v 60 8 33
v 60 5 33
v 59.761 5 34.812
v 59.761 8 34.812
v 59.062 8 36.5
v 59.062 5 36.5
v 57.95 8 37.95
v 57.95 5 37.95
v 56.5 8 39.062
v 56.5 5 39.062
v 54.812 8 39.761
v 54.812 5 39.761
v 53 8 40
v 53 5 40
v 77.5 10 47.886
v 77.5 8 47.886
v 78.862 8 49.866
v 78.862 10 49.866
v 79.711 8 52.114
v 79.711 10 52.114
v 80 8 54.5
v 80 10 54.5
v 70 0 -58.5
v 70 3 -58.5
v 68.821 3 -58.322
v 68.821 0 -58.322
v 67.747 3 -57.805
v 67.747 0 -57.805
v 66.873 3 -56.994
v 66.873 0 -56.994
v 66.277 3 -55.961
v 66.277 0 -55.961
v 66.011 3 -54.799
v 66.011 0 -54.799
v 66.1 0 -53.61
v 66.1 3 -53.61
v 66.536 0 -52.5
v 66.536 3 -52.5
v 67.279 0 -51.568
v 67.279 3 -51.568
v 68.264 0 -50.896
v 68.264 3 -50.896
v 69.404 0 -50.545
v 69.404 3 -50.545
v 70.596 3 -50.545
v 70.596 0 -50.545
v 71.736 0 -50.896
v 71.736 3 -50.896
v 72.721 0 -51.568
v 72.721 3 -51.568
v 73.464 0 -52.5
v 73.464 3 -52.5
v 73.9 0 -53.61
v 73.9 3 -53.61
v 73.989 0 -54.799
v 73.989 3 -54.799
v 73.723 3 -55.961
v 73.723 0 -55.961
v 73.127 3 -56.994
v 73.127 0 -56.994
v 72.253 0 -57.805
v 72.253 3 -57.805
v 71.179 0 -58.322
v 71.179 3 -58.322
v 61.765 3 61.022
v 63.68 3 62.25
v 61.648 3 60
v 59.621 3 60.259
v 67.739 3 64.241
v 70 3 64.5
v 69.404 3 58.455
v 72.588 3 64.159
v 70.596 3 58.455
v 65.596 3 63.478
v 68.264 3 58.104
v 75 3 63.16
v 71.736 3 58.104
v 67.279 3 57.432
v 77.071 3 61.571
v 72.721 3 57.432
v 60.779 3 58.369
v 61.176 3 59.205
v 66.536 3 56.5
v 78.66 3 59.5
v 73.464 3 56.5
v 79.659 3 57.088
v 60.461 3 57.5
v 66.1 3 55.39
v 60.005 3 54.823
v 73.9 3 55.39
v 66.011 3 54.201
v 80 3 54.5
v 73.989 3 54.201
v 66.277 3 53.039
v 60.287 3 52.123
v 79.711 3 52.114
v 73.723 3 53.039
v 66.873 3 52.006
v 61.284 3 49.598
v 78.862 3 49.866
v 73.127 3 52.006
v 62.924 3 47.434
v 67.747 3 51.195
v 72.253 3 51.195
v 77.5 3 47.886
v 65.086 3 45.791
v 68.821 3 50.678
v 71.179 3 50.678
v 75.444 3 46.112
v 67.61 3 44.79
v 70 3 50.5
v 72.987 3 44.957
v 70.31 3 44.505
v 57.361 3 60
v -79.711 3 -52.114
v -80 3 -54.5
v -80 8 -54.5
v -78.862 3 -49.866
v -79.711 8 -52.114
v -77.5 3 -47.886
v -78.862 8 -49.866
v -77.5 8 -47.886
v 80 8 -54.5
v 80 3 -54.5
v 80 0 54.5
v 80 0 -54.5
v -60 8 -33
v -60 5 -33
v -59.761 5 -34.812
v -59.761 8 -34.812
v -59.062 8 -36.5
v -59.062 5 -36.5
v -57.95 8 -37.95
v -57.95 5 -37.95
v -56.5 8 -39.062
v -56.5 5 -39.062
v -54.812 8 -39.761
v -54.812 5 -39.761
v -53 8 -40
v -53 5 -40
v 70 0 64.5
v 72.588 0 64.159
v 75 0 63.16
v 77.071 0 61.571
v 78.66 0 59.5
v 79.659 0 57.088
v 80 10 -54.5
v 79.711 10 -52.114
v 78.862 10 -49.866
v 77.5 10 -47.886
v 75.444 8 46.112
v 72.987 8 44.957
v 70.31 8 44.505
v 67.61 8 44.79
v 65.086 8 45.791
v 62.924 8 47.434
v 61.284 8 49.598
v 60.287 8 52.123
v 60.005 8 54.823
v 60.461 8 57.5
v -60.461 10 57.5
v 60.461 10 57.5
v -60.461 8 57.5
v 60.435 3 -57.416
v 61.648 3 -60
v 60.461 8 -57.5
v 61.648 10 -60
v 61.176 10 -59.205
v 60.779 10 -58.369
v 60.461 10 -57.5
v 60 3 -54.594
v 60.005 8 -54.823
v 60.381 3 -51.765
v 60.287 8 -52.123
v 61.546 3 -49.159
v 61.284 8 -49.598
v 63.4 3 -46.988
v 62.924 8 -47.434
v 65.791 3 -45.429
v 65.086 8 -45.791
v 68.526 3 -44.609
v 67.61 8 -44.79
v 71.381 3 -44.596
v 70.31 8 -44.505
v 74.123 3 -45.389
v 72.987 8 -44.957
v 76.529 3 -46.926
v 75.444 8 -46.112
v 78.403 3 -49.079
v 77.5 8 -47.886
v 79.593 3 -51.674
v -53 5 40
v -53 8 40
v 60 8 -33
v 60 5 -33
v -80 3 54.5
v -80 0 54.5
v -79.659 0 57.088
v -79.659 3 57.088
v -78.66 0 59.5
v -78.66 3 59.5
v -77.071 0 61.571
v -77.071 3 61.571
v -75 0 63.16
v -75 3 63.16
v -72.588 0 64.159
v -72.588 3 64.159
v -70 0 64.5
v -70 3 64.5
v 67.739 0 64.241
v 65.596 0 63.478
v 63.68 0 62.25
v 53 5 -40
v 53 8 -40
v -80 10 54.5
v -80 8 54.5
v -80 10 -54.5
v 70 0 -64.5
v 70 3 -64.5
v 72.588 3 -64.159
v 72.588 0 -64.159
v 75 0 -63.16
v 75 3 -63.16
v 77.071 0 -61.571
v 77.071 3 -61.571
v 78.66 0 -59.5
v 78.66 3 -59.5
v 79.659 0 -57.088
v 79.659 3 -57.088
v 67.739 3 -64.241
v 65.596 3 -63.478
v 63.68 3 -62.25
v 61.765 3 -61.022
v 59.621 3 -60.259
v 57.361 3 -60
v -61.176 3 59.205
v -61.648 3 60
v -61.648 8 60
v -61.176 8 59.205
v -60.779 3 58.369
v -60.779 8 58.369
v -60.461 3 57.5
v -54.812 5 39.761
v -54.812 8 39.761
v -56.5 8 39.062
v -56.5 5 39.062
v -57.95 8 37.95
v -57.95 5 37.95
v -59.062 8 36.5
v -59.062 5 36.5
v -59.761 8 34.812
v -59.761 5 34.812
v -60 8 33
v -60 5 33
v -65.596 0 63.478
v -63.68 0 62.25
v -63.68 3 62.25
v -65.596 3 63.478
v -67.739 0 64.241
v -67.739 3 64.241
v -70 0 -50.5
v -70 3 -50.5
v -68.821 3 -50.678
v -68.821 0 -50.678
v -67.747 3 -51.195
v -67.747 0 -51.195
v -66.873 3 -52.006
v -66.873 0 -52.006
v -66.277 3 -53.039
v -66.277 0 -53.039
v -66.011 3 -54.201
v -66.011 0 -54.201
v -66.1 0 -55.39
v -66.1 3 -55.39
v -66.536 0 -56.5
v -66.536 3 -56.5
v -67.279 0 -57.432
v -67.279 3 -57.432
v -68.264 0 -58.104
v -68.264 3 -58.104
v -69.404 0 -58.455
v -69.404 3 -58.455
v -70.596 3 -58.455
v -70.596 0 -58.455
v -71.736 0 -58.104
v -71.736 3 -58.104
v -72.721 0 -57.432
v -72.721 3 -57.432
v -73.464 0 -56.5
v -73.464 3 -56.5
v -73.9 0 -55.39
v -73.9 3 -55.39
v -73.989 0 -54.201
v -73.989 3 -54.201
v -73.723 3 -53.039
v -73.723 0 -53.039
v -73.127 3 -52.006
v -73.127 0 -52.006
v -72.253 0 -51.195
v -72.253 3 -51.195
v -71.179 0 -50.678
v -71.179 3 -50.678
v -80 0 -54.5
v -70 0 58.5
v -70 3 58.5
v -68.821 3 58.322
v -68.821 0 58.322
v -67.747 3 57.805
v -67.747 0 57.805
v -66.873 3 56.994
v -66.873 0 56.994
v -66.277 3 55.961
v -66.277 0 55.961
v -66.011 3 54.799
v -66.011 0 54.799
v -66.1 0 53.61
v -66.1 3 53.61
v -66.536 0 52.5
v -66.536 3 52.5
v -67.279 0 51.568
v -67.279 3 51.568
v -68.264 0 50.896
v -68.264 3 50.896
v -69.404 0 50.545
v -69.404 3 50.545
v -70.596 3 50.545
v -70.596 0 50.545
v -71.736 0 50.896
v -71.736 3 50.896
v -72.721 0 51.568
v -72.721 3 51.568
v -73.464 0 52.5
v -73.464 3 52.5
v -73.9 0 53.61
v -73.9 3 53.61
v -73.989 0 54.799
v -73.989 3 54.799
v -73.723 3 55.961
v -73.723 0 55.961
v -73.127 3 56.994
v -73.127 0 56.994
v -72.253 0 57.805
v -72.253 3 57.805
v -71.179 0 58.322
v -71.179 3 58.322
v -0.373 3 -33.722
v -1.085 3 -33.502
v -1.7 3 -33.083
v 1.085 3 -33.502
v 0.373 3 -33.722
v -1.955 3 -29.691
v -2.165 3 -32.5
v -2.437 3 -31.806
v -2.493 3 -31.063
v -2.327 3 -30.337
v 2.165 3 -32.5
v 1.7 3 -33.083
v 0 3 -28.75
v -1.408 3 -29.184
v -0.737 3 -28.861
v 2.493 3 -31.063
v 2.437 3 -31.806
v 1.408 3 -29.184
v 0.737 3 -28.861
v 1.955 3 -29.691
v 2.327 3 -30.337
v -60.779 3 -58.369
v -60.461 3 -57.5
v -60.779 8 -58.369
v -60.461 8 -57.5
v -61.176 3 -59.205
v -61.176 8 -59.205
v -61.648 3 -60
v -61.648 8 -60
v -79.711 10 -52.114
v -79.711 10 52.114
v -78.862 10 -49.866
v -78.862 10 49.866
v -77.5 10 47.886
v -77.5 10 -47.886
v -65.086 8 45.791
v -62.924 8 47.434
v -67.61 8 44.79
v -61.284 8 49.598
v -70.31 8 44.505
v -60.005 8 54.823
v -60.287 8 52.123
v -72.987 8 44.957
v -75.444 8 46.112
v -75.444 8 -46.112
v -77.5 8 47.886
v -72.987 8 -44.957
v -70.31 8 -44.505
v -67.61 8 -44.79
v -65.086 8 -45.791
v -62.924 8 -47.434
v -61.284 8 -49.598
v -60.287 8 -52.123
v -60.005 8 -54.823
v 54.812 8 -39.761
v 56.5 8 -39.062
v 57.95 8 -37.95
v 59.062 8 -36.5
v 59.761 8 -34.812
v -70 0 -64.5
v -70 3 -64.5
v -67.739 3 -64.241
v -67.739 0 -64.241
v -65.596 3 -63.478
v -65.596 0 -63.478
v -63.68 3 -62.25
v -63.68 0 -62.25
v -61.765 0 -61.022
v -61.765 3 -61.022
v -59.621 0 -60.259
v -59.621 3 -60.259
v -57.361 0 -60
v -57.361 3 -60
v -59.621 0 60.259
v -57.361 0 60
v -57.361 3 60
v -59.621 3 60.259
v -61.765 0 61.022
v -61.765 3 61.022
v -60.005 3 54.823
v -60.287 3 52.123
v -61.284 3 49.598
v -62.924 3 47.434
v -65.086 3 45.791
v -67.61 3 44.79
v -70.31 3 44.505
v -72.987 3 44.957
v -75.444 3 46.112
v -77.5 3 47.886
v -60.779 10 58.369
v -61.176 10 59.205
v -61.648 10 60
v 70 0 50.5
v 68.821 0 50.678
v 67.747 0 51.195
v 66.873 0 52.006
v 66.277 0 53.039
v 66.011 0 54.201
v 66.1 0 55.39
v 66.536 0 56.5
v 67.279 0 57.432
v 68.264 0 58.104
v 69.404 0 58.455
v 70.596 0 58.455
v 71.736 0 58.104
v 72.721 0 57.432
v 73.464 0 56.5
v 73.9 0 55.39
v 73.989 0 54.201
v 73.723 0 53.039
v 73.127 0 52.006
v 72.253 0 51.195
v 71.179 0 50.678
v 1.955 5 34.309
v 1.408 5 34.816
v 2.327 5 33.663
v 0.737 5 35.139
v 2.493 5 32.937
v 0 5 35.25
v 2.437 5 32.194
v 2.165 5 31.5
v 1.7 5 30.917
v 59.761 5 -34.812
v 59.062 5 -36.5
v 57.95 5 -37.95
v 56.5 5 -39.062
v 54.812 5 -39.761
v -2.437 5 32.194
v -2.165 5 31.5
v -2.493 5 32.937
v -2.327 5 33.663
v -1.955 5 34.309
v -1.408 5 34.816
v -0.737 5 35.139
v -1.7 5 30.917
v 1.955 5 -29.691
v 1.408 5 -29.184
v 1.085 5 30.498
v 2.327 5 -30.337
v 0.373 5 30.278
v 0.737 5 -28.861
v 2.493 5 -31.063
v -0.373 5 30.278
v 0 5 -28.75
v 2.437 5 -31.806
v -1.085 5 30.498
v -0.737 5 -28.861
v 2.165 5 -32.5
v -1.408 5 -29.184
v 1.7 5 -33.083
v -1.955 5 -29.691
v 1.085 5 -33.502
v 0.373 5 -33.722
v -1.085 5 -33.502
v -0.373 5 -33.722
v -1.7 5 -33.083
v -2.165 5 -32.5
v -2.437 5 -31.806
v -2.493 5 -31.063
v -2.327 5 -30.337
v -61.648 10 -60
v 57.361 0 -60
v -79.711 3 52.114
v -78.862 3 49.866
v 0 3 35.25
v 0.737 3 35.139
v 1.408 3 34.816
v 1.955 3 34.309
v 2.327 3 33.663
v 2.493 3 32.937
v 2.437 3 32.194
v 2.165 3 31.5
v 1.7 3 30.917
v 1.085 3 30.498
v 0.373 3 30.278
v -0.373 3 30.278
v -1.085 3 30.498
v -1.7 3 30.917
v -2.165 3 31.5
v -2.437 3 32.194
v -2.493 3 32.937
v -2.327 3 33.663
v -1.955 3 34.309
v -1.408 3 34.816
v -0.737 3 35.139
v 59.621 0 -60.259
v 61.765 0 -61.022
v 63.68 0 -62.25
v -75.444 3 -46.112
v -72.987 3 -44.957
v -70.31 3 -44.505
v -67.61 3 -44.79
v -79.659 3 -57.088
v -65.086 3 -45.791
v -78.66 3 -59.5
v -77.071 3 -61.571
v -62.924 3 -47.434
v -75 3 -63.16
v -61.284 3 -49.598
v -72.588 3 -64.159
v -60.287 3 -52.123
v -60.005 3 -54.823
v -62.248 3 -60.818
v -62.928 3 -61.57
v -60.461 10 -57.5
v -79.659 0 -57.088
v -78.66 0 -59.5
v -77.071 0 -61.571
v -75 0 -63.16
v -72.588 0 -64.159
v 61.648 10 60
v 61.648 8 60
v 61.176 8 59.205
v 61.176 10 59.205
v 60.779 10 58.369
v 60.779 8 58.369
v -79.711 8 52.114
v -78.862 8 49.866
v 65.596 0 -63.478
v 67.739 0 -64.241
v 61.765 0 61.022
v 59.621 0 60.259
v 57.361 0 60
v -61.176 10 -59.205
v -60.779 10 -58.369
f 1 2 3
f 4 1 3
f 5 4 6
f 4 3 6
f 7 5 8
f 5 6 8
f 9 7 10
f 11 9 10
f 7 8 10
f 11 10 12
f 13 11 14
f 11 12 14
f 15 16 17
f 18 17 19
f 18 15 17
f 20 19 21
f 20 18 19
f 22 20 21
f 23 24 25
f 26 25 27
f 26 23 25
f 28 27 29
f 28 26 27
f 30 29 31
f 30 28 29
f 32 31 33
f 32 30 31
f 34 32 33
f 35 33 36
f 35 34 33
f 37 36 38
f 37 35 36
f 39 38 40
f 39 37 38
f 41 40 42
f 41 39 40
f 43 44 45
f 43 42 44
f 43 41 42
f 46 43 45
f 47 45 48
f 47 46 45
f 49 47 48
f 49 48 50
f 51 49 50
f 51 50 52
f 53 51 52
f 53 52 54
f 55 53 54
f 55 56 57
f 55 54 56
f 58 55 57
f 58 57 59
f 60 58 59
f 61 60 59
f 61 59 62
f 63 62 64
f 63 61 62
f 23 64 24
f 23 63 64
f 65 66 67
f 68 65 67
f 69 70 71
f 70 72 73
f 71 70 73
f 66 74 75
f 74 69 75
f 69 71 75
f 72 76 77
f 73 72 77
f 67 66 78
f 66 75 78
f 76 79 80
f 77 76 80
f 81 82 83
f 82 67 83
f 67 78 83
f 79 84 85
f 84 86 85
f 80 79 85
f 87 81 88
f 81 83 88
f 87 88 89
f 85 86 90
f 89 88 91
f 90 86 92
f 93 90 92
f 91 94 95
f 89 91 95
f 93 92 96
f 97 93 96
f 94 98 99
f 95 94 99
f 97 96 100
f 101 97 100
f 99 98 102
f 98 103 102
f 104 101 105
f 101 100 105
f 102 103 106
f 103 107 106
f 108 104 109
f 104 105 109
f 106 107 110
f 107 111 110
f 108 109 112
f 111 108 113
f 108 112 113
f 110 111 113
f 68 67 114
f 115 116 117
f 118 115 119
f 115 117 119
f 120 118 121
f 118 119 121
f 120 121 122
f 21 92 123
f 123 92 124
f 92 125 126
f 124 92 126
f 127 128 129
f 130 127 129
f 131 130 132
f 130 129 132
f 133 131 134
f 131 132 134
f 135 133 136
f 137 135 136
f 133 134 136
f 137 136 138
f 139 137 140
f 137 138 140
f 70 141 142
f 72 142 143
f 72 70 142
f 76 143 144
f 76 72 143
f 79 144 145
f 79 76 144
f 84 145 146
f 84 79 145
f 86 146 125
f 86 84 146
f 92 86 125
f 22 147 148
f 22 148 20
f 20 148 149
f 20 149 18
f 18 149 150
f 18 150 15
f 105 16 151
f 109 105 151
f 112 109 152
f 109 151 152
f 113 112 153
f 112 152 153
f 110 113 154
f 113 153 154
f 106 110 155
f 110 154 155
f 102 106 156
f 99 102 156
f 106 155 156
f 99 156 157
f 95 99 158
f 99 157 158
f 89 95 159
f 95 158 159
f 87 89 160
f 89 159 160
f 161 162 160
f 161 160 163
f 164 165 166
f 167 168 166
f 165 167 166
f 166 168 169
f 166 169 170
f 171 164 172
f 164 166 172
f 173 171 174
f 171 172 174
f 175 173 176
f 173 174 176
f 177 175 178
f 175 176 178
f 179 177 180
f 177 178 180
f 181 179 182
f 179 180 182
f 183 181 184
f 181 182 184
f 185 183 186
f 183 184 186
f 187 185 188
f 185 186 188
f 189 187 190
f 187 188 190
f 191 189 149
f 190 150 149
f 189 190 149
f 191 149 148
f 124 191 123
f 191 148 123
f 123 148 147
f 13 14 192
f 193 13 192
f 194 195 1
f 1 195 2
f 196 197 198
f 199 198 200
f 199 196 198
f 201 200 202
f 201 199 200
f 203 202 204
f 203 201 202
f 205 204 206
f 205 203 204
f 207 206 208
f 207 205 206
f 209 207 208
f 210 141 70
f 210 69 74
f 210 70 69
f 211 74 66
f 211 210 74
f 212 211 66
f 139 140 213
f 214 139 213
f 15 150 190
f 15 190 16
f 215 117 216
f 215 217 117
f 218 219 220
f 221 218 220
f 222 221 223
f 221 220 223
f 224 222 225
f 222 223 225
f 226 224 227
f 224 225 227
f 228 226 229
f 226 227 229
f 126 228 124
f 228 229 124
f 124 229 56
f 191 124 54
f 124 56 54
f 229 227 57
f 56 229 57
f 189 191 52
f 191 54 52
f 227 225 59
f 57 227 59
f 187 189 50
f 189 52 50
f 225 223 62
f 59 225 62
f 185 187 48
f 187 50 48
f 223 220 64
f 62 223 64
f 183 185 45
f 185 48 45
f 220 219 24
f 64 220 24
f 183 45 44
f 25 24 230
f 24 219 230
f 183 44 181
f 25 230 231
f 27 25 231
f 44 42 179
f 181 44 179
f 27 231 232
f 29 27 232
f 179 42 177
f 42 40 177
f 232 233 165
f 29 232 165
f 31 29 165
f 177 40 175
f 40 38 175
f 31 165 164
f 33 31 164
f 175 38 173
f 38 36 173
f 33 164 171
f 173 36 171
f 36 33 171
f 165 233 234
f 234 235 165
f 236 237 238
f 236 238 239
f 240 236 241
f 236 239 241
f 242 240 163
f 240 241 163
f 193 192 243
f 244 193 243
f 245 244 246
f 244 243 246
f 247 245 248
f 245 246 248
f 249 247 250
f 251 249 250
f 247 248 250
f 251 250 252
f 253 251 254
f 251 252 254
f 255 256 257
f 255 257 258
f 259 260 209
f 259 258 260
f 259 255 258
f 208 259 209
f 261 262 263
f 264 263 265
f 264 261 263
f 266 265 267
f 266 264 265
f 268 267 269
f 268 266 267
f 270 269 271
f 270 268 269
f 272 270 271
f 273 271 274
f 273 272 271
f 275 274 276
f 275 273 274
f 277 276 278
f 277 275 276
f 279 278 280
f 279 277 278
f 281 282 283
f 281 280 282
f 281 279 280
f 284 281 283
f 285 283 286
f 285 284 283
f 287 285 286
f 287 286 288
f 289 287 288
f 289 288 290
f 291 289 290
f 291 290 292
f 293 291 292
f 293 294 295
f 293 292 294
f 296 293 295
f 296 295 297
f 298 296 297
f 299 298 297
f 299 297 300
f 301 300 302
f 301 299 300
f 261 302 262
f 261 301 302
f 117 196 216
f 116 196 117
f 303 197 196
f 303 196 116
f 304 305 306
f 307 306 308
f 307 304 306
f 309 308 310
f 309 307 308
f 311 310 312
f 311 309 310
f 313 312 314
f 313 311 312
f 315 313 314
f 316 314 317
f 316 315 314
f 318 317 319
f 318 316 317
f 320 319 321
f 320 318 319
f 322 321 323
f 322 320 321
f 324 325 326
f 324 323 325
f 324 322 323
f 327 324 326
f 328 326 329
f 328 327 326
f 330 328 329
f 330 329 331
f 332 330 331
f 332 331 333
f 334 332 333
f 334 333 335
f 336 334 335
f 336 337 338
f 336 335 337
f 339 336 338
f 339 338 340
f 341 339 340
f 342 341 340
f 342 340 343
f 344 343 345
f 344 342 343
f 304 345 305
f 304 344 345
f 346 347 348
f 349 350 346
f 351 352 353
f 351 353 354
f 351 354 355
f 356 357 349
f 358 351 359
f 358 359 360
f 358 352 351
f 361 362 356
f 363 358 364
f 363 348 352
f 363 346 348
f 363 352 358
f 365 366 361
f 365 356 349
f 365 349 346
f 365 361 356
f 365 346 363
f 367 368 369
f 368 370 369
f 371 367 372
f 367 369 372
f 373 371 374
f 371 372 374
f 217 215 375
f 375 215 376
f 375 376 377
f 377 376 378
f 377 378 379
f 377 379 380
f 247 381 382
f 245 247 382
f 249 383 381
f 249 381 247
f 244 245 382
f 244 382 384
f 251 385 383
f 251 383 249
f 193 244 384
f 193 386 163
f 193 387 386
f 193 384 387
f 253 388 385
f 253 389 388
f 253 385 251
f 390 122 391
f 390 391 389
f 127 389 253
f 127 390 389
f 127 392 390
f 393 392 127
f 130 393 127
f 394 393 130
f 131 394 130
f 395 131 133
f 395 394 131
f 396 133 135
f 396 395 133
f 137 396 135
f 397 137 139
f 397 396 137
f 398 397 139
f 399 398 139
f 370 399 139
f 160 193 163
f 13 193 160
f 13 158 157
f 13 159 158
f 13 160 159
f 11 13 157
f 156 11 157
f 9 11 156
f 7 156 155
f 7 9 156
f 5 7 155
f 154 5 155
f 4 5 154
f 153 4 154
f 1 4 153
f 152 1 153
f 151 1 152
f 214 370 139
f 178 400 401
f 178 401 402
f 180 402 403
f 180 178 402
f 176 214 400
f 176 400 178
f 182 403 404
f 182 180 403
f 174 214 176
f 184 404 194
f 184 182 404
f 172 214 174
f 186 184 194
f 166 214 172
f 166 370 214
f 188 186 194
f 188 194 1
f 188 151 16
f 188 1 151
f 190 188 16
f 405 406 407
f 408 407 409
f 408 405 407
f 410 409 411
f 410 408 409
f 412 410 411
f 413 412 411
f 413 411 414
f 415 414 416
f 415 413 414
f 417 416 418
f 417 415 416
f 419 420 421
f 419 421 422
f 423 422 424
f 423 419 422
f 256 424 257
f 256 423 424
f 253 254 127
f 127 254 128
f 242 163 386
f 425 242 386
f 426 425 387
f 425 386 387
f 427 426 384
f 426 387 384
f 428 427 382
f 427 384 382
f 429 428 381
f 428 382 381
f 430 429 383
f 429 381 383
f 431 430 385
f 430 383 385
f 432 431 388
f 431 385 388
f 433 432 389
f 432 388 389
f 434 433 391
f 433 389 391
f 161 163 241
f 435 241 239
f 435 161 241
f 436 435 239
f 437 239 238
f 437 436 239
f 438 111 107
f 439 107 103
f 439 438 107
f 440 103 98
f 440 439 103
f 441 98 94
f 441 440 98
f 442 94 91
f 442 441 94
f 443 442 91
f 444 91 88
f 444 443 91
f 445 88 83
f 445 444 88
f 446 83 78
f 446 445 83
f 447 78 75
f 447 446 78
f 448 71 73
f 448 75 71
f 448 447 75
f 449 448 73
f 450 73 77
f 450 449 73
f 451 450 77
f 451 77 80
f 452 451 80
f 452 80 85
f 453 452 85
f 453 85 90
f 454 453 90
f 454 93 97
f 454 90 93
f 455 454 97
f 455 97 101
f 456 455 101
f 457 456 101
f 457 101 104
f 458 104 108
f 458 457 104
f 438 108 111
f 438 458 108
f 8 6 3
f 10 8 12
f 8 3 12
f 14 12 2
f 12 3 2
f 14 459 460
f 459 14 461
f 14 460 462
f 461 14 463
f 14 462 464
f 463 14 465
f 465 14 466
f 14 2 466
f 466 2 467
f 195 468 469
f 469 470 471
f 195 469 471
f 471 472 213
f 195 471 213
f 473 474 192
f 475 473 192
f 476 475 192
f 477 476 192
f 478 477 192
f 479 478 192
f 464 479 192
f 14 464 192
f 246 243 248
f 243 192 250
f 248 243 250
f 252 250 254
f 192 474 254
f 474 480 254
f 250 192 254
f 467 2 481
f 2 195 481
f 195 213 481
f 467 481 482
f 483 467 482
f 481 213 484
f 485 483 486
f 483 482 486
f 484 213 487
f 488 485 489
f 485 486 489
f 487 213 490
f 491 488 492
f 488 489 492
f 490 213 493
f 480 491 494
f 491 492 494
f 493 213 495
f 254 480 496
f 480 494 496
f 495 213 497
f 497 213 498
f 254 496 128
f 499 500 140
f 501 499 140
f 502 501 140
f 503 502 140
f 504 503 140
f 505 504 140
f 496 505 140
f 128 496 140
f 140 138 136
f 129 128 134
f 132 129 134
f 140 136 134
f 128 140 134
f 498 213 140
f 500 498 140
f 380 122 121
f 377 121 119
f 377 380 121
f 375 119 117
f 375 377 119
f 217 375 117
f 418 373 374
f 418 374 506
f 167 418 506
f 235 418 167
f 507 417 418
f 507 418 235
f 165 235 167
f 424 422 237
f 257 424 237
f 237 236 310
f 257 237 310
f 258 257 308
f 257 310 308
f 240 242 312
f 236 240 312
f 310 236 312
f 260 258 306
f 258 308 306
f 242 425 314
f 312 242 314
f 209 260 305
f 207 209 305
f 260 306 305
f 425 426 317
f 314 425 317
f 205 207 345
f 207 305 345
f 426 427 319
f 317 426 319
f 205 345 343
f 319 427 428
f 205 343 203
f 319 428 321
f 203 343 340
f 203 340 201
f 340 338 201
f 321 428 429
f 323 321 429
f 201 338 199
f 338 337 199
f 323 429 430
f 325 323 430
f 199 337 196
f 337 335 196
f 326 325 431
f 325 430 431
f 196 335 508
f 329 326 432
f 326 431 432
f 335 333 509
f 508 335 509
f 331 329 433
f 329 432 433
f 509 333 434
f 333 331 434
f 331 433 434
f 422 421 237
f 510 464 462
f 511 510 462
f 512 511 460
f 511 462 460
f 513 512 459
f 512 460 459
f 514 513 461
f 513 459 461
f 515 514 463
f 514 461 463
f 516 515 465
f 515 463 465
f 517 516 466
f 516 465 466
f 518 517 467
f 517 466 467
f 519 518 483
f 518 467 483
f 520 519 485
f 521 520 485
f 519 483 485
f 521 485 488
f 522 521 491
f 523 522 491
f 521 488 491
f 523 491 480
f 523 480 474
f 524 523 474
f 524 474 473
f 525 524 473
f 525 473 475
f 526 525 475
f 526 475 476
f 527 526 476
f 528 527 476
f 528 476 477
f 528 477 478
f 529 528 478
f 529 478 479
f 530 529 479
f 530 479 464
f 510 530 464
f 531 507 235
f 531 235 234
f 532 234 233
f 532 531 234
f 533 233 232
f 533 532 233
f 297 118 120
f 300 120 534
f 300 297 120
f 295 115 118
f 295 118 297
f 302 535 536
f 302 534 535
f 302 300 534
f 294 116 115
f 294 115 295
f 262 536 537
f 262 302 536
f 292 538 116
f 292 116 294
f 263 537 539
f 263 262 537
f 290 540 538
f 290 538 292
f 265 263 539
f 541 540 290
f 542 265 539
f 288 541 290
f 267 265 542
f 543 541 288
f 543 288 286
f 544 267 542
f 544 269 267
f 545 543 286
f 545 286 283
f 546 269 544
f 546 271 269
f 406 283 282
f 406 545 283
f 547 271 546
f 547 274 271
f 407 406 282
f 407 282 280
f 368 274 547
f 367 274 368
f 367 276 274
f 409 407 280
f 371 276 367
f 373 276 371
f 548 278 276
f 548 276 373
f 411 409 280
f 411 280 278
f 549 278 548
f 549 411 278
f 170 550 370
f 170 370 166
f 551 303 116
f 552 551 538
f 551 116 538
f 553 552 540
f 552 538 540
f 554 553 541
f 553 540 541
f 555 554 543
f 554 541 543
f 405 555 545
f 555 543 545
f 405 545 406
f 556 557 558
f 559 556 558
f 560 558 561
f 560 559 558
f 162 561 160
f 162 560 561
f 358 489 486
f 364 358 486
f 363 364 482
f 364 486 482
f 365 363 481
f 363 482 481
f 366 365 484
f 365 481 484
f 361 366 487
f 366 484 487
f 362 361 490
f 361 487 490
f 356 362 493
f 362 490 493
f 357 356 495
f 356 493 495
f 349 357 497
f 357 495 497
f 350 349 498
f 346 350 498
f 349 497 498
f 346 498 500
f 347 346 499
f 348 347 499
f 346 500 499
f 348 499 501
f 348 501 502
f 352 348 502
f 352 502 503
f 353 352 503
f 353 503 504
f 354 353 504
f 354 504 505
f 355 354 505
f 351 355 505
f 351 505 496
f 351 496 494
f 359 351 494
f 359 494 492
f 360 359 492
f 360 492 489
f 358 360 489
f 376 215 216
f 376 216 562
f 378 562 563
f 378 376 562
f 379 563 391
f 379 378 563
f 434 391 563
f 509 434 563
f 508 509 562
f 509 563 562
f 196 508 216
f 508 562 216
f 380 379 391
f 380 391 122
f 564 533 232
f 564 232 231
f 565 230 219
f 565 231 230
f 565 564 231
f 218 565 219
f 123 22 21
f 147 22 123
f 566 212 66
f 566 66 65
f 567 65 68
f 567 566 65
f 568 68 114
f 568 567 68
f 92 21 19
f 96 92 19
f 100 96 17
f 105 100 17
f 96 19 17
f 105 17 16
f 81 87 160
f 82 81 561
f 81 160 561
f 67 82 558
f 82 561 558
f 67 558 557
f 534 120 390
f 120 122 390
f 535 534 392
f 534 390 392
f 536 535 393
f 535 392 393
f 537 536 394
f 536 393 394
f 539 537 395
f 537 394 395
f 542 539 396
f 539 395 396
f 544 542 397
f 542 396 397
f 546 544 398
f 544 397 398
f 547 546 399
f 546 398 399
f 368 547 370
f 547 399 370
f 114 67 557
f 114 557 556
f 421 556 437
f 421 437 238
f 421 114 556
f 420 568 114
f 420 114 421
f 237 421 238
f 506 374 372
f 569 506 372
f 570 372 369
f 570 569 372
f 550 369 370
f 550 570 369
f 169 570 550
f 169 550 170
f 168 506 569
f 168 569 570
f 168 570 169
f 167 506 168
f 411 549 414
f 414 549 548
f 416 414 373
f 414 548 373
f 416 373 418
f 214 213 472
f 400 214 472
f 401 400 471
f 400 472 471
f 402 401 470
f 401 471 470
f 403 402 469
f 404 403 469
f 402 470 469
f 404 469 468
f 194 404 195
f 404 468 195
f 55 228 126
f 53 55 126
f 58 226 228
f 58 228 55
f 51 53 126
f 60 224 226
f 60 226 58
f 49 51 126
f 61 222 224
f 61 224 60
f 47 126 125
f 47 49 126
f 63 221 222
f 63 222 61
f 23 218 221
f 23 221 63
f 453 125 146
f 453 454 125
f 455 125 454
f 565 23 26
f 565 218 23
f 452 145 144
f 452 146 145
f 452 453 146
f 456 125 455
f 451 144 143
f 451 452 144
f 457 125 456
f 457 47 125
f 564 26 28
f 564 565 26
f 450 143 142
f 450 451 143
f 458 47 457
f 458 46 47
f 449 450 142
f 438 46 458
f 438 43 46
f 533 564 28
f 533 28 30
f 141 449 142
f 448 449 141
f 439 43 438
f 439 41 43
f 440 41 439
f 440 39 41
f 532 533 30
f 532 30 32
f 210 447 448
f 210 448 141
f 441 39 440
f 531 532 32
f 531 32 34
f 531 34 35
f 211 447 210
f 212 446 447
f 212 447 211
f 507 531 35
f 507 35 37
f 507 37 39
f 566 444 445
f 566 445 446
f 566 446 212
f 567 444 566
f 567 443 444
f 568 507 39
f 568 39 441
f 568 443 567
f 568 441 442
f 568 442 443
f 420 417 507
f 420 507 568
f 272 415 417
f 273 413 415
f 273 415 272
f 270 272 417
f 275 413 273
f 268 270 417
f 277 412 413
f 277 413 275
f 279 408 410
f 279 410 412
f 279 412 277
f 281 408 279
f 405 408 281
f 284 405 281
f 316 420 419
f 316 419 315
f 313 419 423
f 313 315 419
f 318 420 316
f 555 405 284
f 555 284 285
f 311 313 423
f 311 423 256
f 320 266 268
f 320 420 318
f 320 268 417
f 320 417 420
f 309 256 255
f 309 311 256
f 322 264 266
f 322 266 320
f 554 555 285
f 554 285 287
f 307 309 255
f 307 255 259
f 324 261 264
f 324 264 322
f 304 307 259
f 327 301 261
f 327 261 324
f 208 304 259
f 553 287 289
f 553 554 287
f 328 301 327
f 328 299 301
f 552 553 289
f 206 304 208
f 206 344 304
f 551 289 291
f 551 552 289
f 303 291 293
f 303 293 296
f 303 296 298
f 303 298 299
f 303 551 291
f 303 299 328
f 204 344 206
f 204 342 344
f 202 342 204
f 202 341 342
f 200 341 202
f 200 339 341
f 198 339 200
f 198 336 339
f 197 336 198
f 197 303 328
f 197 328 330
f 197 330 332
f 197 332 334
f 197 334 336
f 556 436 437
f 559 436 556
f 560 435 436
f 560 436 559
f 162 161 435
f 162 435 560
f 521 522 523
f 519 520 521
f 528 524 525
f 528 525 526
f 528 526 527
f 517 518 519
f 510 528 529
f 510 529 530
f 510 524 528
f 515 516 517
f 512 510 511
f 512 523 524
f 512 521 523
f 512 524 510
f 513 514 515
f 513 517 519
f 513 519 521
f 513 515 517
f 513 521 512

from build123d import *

# Parameters (mm, degrees)
SKETCH1_W               = 160
SKETCH1_H               = 129
BOSS_EXTRUDE1_DEPTH     = 8
SKETCH1_3_R             = 4
CUT_EXTRUDE2_DEPTH      = 104.074002542
FILLET1_R               = 10
CUT_EXTRUDE4_DEPTH      = 1
CUT_EXTRUDE4_DEPTH_BACK = 3
CUT_EXTRUDE4_START      = 8
CUT_EXTRUDE9_DEPTH      = 104.074002542
CUT_EXTRUDE10_START     = 8
SKETCH1_17_R            = 2.5
SKETCH1_17_R_2          = 10
CUT_EXTRUDE10_DEPTH     = 5
BOSS_EXTRUDE4_START     = 10
BOSS_EXTRUDE4_DEPTH     = 10
FILLET2_R               = 10


with BuildPart() as part:
    # Sketch1 → Boss-Extrude1 (new body)
    with BuildSketch(Plane(origin=(0, 0, 0), x_dir=(1, 0, 0), z_dir=(0, 1, 0))):
        Rectangle(SKETCH1_W, SKETCH1_H)
    extrude(amount=BOSS_EXTRUDE1_DEPTH)

    # Sketch1<3> → Cut-Extrude2 (cut, through all)
    with BuildSketch(Plane(origin=(0, 0, 0), x_dir=(1, 0, 0), z_dir=(0, 1, 0))):
        with Locations(Location((-70, 54.5, 0), (0, 0, 270))):
            Circle(SKETCH1_3_R)
        with Locations(Location((-70, -54.5, 0), (0, 0, 270))):
            Circle(SKETCH1_3_R)
        with Locations(Location((70, -54.5, 0), (0, 0, 90))):
            Circle(SKETCH1_3_R)
        with Locations(Location((70, 54.5, 0), (0, 0, 90))):
            Circle(SKETCH1_3_R)
    extrude(amount=CUT_EXTRUDE2_DEPTH, mode=Mode.SUBTRACT)

    # Fillet1
    fillet1_edges = [part.edges().sort_by_distance(p)[0] for p in [
        (80, 4, 64.5),
        (-80, 4, 64.5),
        (-80, 4, -64.5),
        (80, 4, -64.5),
    ]]
    fillet(fillet1_edges, radius=FILLET1_R)

    # Sketch1<11> → Cut-Extrude4 (cut, two sides: drawn at the far end of the back side and taken through both)
    with BuildSketch(Plane(origin=(0, 0, 0), x_dir=(1, 0, 0), z_dir=(0, 1, 0)).offset(CUT_EXTRUDE4_START - CUT_EXTRUDE4_DEPTH_BACK)):
        with BuildLine():
            Line((53, -40), (-53, -40))
            ThreePointArc((-53, -40), (-57.949747468, -37.949747468), (-60, -33))
            Line((-60, -33), (-60, 33))
            ThreePointArc((-60, 33), (-57.949747468, 37.949747468), (-53, 40))
            Line((-53, 40), (53, 40))
            ThreePointArc((53, 40), (57.949747468, 37.949747468), (60, 33))
            Line((60, 33), (60, -33))
            ThreePointArc((60, -33), (57.949747468, -37.949747468), (53, -40))
        make_face()
    extrude(amount=CUT_EXTRUDE4_DEPTH + CUT_EXTRUDE4_DEPTH_BACK, mode=Mode.SUBTRACT)

    # Sketch1<13> → Cut-Extrude9 (cut, through all)
    with BuildSketch(Plane(origin=(0, 0, 0), x_dir=(1, 0, 0), z_dir=(0, 1, 0))):
        with BuildLine():
            Line((-70, -64.5), (70, -64.5))
            ThreePointArc((70, -64.5), (65.25658351, -63.303408431), (61.648353456, -60))
            Line((61.648353456, -60), (-61.648353456, -60))
            ThreePointArc((-61.648353456, -60), (-65.25658351, -63.303408431), (-70, -64.5))
        make_face()
        with BuildLine():
            ThreePointArc((61.648353456, 60), (65.25658351, 63.303408431), (70, 64.5))
            Line((70, 64.5), (-69.999999984, 64.5))
            ThreePointArc((-69.999999984, 64.5), (-65.256583502, 63.303408427), (-61.648353456, 60))
            Line((-61.648353456, 60), (61.648353456, 60))
        make_face()
    extrude(amount=CUT_EXTRUDE9_DEPTH, mode=Mode.SUBTRACT)

    # Sketch1<17> → Cut-Extrude10 (cut)
    with BuildSketch(Plane(origin=(0, 0, 0), x_dir=(1, 0, 0), z_dir=(0, 1, 0)).offset(CUT_EXTRUDE10_START)):
        with Locations(Location((0, 31.25, 0), (0, 0, 270))):
            Circle(SKETCH1_17_R)
        with Locations((-70, 54.5)):
            Circle(SKETCH1_17_R_2)
        with Locations((70, 54.5)):
            Circle(SKETCH1_17_R_2)
        with Locations((-70, -54.5)):
            Circle(SKETCH1_17_R_2)
        with Locations((70, -54.5)):
            Circle(SKETCH1_17_R_2)
        with Locations(Location((0, -32.75, 0), (0, 0, 270))):
            Circle(SKETCH1_17_R)
    extrude(amount=-CUT_EXTRUDE10_DEPTH, mode=Mode.SUBTRACT)

    # Sketch1<18> → Boss-Extrude4 (add)
    with BuildSketch(Plane(origin=(0, 0, 0), x_dir=(1, 0, 0), z_dir=(0, 1, 0)).offset(BOSS_EXTRUDE4_START)):
        with BuildLine():
            ThreePointArc((60.460607986, 57.5), (60.967568701, 58.791291743), (61.648353456, 60))
            Line((61.648353456, 60), (-61.648353456, 60))
            ThreePointArc((-61.648353456, 60), (-60.967568701, 58.791291743), (-60.460607986, 57.5))
            Line((-60.460607986, 57.5), (60.460607986, 57.5))
        make_face()
        with BuildLine():
            Line((-80, 54.500000177), (-80, -54.5))
            ThreePointArc((-80, -54.5), (-79.354143467, -50.964466094), (-77.5, -47.885621722))
            Line((-77.5, -47.885621722), (-77.5, 47.885621722))
            ThreePointArc((-77.5, 47.885621722), (-79.354143498, 50.964466177), (-80, 54.500000177))
        make_face()
        with BuildLine():
            ThreePointArc((77.5, -47.885621722), (79.354143467, -50.964466094), (80, -54.5))
            Line((80, -54.5), (80, 54.5))
            ThreePointArc((80, 54.5), (79.354143467, 50.964466094), (77.5, 47.885621722))
            Line((77.5, 47.885621722), (77.5, -47.885621722))
        make_face()
        with BuildLine():
            Line((-61.648353456, -60), (61.648353456, -60))
            ThreePointArc((61.648353456, -60), (60.967568701, -58.791291743), (60.460607986, -57.5))
            Line((60.460607986, -57.5), (-60.460607986, -57.5))
            ThreePointArc((-60.460607986, -57.5), (-60.967568701, -58.791291743), (-61.648353456, -60))
        make_face()
    extrude(amount=-BOSS_EXTRUDE4_DEPTH)

    # Fillet2
    # the kernel refuses this fillet: 10 mm, written as the material it adds along each edge
    with BuildSketch(Plane(origin=(61.648353456, 0, 60), x_dir=(0.6702455950029323, 0, 0.7421393685684416), z_dir=(0, 1, 0)), Plane(origin=(-61.648353456, 0, -60), x_dir=(-0.6702455950029282, 0, -0.7421393685684453), z_dir=(0, 1, 0))) as fillet2_piece_1:
        with BuildLine():
            CenterArc((4.547663341, -9.884436465), FILLET2_R, 98.719009802, 39.194967426)
            Line((-2.873730345, -3.181980515), (0, 0))
            ThreePointArc((0, 0), (1.51588778, -0.115563535), (3.03177556, 0))
        make_face()
    extrude(amount=3)
    with BuildSketch(Plane(origin=(-61.648353456, 0, 60), x_dir=(1, 0, 0), z_dir=(0, 1, 0))) as fillet2_piece_2:
        with BuildLine():
            CenterArc((4.287578116, -10), FILLET2_R, 90, 39.194967426)
            ThreePointArc((-2.032034214, -2.25), (-0.930252859, -1.20245595), (0, 0))
            Line((0, 0), (4.287578116, 0))
        make_face()
    extrude(amount=3)
    with BuildSketch(Plane(origin=(61.648353456, 0, -60), x_dir=(0.6702455950029361, 0, -0.7421393685684381), z_dir=(0, 1, 0))) as fillet2_piece_3:
        with BuildLine():
            CenterArc((4.547663341, 9.884436465), FILLET2_R, 222.086022772, 39.194967426)
            Line((-2.873730345, 3.181980515), (0, 0))
            ThreePointArc((0, 0), (1.51588778, 0.115563535), (3.03177556, 0))
        make_face()
    extrude(amount=3)


solid = part.part
